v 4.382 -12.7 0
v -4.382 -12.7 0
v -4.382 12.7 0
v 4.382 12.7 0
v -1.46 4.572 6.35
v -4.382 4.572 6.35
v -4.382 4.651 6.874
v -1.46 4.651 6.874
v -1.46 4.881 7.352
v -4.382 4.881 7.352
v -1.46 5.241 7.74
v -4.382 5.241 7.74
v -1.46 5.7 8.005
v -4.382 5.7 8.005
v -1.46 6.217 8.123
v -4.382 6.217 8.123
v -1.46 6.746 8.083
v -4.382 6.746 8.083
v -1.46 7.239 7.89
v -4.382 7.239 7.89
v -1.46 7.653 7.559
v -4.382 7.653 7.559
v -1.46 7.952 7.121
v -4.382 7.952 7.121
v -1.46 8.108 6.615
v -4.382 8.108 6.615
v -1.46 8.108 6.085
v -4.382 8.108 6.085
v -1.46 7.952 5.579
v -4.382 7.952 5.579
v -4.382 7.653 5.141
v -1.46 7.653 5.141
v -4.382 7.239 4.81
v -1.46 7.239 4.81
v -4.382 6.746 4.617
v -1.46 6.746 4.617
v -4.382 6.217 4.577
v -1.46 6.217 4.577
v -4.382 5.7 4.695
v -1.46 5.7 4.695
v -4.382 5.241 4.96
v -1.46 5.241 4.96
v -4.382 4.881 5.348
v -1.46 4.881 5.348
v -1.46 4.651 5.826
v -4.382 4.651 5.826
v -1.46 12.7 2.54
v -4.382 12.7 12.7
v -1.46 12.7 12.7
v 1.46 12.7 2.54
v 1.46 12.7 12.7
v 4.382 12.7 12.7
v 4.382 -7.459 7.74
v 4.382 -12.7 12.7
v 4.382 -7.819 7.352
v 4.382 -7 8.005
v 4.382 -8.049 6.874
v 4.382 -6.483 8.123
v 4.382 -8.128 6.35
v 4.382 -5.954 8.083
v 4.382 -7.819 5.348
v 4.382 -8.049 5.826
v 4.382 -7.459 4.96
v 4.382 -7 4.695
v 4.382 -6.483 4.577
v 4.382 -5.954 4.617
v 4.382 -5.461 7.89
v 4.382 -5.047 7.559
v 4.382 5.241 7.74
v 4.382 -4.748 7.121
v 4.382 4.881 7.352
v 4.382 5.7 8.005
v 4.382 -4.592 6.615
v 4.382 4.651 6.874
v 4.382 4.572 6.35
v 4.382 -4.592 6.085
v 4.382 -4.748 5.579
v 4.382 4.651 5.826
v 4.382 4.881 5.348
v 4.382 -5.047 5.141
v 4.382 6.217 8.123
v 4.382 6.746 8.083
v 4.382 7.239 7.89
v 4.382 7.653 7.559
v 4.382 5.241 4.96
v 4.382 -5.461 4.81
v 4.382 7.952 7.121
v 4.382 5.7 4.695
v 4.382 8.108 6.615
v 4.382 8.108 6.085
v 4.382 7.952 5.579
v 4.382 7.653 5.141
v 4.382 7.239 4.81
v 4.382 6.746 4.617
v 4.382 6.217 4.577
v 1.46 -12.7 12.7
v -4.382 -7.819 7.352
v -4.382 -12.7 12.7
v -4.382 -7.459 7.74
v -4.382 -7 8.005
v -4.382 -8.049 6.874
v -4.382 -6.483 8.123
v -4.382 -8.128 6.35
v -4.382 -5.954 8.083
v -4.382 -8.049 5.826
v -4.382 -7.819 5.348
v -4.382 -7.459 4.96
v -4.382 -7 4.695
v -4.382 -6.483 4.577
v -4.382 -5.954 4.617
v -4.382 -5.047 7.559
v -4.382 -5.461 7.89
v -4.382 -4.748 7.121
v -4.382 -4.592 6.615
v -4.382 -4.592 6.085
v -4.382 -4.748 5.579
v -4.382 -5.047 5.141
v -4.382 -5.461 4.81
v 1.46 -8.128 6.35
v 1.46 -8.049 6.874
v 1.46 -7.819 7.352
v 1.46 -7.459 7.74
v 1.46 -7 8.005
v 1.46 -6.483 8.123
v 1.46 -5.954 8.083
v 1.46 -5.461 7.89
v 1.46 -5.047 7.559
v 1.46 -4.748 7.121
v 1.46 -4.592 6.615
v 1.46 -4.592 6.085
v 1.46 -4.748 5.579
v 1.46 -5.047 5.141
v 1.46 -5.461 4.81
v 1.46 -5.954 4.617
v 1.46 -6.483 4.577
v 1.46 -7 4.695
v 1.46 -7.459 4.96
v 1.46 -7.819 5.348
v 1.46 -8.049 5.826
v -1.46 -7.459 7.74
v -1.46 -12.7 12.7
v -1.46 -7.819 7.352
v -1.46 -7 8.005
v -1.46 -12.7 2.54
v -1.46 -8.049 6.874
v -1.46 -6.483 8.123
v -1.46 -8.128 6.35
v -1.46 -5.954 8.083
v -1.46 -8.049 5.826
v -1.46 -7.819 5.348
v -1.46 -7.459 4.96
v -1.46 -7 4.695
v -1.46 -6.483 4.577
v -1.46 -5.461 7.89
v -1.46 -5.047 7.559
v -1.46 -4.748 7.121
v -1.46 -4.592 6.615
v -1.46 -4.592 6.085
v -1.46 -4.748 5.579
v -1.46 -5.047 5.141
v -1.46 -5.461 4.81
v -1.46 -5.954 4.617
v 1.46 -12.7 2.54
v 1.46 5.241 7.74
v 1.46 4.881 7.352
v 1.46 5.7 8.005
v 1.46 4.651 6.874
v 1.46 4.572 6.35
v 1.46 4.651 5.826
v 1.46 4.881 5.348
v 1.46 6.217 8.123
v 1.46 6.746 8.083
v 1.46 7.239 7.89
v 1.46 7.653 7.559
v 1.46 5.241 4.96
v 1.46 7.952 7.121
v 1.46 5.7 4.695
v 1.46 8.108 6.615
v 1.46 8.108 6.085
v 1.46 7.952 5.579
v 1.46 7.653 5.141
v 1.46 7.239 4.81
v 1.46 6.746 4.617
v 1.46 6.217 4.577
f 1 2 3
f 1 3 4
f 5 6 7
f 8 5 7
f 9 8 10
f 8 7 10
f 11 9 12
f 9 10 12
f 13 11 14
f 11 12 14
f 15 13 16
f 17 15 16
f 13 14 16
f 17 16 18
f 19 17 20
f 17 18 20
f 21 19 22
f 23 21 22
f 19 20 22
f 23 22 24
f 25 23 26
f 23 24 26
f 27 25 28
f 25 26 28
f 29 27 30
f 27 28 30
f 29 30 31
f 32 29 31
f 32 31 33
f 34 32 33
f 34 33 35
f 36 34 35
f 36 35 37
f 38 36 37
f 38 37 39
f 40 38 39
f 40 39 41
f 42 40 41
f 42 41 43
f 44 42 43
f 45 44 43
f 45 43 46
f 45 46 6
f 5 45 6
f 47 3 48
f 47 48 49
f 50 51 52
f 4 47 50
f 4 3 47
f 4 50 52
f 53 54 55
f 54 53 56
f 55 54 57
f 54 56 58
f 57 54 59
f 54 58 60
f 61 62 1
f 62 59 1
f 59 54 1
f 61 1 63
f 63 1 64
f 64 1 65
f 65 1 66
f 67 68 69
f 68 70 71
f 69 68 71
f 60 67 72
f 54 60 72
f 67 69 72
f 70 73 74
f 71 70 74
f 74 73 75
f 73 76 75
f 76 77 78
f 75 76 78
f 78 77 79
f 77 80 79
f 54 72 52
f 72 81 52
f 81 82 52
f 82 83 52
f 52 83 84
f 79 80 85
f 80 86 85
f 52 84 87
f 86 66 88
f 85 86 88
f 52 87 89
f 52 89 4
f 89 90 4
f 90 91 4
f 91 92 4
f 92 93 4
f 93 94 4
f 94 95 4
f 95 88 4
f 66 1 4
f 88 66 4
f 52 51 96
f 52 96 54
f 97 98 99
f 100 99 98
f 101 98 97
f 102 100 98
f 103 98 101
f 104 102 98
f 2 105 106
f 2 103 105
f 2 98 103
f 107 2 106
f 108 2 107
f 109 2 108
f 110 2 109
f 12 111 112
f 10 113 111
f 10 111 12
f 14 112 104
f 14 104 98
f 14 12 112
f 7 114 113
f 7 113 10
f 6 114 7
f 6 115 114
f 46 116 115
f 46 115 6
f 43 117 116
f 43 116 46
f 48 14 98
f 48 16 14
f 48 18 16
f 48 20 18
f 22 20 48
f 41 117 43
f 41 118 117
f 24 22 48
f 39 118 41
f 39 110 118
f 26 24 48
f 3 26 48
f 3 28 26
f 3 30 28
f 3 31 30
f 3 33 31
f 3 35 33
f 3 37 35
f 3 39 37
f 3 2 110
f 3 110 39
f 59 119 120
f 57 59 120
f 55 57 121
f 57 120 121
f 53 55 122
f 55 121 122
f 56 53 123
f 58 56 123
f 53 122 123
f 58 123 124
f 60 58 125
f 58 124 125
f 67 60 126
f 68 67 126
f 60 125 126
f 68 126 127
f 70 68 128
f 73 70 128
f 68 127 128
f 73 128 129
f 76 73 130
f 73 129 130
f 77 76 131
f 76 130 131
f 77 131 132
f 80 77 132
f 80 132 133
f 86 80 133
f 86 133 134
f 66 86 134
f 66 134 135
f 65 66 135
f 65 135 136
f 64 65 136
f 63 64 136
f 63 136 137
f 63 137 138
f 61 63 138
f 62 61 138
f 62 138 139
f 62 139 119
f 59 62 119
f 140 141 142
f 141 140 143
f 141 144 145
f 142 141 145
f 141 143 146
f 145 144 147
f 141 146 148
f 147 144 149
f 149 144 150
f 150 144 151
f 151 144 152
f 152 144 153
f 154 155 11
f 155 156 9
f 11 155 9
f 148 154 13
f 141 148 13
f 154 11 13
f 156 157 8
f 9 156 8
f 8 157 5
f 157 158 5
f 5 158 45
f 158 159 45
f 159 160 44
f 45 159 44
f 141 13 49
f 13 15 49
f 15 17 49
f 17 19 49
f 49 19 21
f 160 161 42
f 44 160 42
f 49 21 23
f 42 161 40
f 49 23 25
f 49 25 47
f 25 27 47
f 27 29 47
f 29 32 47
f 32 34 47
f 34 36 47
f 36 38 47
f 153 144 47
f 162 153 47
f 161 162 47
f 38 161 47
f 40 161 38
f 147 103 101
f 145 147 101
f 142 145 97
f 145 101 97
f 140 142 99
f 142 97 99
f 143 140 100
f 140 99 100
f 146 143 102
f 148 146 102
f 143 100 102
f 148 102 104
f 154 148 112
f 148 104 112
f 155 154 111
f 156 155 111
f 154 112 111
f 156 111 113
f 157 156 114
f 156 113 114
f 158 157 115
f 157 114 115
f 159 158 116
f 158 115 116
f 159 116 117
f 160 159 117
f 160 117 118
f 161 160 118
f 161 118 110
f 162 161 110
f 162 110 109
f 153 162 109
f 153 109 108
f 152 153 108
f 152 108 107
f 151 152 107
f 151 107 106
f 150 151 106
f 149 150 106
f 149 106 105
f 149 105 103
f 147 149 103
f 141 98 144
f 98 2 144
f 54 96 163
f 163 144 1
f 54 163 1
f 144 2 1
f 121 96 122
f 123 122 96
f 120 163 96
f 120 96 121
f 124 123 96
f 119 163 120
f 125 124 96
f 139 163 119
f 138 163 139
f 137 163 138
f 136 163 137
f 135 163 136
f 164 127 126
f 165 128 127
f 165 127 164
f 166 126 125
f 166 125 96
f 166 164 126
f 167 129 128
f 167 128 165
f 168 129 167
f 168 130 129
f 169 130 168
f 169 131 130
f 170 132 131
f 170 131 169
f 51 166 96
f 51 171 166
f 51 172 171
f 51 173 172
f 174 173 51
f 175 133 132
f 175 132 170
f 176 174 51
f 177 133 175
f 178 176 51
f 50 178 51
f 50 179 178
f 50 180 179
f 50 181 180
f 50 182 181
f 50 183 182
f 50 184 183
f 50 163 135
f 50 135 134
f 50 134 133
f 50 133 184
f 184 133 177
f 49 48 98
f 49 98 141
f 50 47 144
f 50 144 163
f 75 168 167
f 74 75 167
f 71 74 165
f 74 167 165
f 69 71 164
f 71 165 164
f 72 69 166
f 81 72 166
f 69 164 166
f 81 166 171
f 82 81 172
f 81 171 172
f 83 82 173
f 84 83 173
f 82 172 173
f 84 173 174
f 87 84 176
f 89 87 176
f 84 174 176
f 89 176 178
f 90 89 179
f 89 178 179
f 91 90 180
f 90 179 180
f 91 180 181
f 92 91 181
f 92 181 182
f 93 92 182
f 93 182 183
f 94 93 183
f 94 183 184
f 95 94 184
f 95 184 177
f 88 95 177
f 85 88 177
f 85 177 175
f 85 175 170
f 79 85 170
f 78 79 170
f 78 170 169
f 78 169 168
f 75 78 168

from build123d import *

# Parameters (mm, degrees)
F0_W     = 2.921
F0_H     = 25.4
F1_DEPTH = 2.54
F2_W     = 2.921
F2_H     = 25.4
F3_DEPTH = 10.16
F4_R     = 1.778
F5_DEPTH = 25.4


with BuildPart() as f1:
    # F0 (on Top) → F1 (new body)
    with BuildSketch(Plane.XY):
        Rectangle(F0_W, F0_H)
        with Locations((-2.921, 0)):
            Rectangle(F0_W, F0_H)
        with Locations((2.921, 0)):
            Rectangle(F0_W, F0_H)
    extrude(amount=F1_DEPTH)

    # F2 (on face) → F3 (join)
    with BuildSketch(Plane.XY.offset(2.54)):
        with Locations((-2.921, 0)):
            Rectangle(F2_W, F2_H)
        with Locations((2.921, 0)):
            Rectangle(F2_W, F2_H)
    extrude(amount=F3_DEPTH)

    # F4 (on face) → F5 (cut)
    with BuildSketch(Plane(origin=(-4.3815, 0, 0), x_dir=(0, -1, 0), z_dir=(-1, 0, 0))):
        with Locations((-6.35, 6.35)):
            Circle(F4_R)
        with Locations((6.35, 6.35)):
            Circle(F4_R)
    extrude(amount=-F5_DEPTH, mode=Mode.SUBTRACT)


solid = f1.part
